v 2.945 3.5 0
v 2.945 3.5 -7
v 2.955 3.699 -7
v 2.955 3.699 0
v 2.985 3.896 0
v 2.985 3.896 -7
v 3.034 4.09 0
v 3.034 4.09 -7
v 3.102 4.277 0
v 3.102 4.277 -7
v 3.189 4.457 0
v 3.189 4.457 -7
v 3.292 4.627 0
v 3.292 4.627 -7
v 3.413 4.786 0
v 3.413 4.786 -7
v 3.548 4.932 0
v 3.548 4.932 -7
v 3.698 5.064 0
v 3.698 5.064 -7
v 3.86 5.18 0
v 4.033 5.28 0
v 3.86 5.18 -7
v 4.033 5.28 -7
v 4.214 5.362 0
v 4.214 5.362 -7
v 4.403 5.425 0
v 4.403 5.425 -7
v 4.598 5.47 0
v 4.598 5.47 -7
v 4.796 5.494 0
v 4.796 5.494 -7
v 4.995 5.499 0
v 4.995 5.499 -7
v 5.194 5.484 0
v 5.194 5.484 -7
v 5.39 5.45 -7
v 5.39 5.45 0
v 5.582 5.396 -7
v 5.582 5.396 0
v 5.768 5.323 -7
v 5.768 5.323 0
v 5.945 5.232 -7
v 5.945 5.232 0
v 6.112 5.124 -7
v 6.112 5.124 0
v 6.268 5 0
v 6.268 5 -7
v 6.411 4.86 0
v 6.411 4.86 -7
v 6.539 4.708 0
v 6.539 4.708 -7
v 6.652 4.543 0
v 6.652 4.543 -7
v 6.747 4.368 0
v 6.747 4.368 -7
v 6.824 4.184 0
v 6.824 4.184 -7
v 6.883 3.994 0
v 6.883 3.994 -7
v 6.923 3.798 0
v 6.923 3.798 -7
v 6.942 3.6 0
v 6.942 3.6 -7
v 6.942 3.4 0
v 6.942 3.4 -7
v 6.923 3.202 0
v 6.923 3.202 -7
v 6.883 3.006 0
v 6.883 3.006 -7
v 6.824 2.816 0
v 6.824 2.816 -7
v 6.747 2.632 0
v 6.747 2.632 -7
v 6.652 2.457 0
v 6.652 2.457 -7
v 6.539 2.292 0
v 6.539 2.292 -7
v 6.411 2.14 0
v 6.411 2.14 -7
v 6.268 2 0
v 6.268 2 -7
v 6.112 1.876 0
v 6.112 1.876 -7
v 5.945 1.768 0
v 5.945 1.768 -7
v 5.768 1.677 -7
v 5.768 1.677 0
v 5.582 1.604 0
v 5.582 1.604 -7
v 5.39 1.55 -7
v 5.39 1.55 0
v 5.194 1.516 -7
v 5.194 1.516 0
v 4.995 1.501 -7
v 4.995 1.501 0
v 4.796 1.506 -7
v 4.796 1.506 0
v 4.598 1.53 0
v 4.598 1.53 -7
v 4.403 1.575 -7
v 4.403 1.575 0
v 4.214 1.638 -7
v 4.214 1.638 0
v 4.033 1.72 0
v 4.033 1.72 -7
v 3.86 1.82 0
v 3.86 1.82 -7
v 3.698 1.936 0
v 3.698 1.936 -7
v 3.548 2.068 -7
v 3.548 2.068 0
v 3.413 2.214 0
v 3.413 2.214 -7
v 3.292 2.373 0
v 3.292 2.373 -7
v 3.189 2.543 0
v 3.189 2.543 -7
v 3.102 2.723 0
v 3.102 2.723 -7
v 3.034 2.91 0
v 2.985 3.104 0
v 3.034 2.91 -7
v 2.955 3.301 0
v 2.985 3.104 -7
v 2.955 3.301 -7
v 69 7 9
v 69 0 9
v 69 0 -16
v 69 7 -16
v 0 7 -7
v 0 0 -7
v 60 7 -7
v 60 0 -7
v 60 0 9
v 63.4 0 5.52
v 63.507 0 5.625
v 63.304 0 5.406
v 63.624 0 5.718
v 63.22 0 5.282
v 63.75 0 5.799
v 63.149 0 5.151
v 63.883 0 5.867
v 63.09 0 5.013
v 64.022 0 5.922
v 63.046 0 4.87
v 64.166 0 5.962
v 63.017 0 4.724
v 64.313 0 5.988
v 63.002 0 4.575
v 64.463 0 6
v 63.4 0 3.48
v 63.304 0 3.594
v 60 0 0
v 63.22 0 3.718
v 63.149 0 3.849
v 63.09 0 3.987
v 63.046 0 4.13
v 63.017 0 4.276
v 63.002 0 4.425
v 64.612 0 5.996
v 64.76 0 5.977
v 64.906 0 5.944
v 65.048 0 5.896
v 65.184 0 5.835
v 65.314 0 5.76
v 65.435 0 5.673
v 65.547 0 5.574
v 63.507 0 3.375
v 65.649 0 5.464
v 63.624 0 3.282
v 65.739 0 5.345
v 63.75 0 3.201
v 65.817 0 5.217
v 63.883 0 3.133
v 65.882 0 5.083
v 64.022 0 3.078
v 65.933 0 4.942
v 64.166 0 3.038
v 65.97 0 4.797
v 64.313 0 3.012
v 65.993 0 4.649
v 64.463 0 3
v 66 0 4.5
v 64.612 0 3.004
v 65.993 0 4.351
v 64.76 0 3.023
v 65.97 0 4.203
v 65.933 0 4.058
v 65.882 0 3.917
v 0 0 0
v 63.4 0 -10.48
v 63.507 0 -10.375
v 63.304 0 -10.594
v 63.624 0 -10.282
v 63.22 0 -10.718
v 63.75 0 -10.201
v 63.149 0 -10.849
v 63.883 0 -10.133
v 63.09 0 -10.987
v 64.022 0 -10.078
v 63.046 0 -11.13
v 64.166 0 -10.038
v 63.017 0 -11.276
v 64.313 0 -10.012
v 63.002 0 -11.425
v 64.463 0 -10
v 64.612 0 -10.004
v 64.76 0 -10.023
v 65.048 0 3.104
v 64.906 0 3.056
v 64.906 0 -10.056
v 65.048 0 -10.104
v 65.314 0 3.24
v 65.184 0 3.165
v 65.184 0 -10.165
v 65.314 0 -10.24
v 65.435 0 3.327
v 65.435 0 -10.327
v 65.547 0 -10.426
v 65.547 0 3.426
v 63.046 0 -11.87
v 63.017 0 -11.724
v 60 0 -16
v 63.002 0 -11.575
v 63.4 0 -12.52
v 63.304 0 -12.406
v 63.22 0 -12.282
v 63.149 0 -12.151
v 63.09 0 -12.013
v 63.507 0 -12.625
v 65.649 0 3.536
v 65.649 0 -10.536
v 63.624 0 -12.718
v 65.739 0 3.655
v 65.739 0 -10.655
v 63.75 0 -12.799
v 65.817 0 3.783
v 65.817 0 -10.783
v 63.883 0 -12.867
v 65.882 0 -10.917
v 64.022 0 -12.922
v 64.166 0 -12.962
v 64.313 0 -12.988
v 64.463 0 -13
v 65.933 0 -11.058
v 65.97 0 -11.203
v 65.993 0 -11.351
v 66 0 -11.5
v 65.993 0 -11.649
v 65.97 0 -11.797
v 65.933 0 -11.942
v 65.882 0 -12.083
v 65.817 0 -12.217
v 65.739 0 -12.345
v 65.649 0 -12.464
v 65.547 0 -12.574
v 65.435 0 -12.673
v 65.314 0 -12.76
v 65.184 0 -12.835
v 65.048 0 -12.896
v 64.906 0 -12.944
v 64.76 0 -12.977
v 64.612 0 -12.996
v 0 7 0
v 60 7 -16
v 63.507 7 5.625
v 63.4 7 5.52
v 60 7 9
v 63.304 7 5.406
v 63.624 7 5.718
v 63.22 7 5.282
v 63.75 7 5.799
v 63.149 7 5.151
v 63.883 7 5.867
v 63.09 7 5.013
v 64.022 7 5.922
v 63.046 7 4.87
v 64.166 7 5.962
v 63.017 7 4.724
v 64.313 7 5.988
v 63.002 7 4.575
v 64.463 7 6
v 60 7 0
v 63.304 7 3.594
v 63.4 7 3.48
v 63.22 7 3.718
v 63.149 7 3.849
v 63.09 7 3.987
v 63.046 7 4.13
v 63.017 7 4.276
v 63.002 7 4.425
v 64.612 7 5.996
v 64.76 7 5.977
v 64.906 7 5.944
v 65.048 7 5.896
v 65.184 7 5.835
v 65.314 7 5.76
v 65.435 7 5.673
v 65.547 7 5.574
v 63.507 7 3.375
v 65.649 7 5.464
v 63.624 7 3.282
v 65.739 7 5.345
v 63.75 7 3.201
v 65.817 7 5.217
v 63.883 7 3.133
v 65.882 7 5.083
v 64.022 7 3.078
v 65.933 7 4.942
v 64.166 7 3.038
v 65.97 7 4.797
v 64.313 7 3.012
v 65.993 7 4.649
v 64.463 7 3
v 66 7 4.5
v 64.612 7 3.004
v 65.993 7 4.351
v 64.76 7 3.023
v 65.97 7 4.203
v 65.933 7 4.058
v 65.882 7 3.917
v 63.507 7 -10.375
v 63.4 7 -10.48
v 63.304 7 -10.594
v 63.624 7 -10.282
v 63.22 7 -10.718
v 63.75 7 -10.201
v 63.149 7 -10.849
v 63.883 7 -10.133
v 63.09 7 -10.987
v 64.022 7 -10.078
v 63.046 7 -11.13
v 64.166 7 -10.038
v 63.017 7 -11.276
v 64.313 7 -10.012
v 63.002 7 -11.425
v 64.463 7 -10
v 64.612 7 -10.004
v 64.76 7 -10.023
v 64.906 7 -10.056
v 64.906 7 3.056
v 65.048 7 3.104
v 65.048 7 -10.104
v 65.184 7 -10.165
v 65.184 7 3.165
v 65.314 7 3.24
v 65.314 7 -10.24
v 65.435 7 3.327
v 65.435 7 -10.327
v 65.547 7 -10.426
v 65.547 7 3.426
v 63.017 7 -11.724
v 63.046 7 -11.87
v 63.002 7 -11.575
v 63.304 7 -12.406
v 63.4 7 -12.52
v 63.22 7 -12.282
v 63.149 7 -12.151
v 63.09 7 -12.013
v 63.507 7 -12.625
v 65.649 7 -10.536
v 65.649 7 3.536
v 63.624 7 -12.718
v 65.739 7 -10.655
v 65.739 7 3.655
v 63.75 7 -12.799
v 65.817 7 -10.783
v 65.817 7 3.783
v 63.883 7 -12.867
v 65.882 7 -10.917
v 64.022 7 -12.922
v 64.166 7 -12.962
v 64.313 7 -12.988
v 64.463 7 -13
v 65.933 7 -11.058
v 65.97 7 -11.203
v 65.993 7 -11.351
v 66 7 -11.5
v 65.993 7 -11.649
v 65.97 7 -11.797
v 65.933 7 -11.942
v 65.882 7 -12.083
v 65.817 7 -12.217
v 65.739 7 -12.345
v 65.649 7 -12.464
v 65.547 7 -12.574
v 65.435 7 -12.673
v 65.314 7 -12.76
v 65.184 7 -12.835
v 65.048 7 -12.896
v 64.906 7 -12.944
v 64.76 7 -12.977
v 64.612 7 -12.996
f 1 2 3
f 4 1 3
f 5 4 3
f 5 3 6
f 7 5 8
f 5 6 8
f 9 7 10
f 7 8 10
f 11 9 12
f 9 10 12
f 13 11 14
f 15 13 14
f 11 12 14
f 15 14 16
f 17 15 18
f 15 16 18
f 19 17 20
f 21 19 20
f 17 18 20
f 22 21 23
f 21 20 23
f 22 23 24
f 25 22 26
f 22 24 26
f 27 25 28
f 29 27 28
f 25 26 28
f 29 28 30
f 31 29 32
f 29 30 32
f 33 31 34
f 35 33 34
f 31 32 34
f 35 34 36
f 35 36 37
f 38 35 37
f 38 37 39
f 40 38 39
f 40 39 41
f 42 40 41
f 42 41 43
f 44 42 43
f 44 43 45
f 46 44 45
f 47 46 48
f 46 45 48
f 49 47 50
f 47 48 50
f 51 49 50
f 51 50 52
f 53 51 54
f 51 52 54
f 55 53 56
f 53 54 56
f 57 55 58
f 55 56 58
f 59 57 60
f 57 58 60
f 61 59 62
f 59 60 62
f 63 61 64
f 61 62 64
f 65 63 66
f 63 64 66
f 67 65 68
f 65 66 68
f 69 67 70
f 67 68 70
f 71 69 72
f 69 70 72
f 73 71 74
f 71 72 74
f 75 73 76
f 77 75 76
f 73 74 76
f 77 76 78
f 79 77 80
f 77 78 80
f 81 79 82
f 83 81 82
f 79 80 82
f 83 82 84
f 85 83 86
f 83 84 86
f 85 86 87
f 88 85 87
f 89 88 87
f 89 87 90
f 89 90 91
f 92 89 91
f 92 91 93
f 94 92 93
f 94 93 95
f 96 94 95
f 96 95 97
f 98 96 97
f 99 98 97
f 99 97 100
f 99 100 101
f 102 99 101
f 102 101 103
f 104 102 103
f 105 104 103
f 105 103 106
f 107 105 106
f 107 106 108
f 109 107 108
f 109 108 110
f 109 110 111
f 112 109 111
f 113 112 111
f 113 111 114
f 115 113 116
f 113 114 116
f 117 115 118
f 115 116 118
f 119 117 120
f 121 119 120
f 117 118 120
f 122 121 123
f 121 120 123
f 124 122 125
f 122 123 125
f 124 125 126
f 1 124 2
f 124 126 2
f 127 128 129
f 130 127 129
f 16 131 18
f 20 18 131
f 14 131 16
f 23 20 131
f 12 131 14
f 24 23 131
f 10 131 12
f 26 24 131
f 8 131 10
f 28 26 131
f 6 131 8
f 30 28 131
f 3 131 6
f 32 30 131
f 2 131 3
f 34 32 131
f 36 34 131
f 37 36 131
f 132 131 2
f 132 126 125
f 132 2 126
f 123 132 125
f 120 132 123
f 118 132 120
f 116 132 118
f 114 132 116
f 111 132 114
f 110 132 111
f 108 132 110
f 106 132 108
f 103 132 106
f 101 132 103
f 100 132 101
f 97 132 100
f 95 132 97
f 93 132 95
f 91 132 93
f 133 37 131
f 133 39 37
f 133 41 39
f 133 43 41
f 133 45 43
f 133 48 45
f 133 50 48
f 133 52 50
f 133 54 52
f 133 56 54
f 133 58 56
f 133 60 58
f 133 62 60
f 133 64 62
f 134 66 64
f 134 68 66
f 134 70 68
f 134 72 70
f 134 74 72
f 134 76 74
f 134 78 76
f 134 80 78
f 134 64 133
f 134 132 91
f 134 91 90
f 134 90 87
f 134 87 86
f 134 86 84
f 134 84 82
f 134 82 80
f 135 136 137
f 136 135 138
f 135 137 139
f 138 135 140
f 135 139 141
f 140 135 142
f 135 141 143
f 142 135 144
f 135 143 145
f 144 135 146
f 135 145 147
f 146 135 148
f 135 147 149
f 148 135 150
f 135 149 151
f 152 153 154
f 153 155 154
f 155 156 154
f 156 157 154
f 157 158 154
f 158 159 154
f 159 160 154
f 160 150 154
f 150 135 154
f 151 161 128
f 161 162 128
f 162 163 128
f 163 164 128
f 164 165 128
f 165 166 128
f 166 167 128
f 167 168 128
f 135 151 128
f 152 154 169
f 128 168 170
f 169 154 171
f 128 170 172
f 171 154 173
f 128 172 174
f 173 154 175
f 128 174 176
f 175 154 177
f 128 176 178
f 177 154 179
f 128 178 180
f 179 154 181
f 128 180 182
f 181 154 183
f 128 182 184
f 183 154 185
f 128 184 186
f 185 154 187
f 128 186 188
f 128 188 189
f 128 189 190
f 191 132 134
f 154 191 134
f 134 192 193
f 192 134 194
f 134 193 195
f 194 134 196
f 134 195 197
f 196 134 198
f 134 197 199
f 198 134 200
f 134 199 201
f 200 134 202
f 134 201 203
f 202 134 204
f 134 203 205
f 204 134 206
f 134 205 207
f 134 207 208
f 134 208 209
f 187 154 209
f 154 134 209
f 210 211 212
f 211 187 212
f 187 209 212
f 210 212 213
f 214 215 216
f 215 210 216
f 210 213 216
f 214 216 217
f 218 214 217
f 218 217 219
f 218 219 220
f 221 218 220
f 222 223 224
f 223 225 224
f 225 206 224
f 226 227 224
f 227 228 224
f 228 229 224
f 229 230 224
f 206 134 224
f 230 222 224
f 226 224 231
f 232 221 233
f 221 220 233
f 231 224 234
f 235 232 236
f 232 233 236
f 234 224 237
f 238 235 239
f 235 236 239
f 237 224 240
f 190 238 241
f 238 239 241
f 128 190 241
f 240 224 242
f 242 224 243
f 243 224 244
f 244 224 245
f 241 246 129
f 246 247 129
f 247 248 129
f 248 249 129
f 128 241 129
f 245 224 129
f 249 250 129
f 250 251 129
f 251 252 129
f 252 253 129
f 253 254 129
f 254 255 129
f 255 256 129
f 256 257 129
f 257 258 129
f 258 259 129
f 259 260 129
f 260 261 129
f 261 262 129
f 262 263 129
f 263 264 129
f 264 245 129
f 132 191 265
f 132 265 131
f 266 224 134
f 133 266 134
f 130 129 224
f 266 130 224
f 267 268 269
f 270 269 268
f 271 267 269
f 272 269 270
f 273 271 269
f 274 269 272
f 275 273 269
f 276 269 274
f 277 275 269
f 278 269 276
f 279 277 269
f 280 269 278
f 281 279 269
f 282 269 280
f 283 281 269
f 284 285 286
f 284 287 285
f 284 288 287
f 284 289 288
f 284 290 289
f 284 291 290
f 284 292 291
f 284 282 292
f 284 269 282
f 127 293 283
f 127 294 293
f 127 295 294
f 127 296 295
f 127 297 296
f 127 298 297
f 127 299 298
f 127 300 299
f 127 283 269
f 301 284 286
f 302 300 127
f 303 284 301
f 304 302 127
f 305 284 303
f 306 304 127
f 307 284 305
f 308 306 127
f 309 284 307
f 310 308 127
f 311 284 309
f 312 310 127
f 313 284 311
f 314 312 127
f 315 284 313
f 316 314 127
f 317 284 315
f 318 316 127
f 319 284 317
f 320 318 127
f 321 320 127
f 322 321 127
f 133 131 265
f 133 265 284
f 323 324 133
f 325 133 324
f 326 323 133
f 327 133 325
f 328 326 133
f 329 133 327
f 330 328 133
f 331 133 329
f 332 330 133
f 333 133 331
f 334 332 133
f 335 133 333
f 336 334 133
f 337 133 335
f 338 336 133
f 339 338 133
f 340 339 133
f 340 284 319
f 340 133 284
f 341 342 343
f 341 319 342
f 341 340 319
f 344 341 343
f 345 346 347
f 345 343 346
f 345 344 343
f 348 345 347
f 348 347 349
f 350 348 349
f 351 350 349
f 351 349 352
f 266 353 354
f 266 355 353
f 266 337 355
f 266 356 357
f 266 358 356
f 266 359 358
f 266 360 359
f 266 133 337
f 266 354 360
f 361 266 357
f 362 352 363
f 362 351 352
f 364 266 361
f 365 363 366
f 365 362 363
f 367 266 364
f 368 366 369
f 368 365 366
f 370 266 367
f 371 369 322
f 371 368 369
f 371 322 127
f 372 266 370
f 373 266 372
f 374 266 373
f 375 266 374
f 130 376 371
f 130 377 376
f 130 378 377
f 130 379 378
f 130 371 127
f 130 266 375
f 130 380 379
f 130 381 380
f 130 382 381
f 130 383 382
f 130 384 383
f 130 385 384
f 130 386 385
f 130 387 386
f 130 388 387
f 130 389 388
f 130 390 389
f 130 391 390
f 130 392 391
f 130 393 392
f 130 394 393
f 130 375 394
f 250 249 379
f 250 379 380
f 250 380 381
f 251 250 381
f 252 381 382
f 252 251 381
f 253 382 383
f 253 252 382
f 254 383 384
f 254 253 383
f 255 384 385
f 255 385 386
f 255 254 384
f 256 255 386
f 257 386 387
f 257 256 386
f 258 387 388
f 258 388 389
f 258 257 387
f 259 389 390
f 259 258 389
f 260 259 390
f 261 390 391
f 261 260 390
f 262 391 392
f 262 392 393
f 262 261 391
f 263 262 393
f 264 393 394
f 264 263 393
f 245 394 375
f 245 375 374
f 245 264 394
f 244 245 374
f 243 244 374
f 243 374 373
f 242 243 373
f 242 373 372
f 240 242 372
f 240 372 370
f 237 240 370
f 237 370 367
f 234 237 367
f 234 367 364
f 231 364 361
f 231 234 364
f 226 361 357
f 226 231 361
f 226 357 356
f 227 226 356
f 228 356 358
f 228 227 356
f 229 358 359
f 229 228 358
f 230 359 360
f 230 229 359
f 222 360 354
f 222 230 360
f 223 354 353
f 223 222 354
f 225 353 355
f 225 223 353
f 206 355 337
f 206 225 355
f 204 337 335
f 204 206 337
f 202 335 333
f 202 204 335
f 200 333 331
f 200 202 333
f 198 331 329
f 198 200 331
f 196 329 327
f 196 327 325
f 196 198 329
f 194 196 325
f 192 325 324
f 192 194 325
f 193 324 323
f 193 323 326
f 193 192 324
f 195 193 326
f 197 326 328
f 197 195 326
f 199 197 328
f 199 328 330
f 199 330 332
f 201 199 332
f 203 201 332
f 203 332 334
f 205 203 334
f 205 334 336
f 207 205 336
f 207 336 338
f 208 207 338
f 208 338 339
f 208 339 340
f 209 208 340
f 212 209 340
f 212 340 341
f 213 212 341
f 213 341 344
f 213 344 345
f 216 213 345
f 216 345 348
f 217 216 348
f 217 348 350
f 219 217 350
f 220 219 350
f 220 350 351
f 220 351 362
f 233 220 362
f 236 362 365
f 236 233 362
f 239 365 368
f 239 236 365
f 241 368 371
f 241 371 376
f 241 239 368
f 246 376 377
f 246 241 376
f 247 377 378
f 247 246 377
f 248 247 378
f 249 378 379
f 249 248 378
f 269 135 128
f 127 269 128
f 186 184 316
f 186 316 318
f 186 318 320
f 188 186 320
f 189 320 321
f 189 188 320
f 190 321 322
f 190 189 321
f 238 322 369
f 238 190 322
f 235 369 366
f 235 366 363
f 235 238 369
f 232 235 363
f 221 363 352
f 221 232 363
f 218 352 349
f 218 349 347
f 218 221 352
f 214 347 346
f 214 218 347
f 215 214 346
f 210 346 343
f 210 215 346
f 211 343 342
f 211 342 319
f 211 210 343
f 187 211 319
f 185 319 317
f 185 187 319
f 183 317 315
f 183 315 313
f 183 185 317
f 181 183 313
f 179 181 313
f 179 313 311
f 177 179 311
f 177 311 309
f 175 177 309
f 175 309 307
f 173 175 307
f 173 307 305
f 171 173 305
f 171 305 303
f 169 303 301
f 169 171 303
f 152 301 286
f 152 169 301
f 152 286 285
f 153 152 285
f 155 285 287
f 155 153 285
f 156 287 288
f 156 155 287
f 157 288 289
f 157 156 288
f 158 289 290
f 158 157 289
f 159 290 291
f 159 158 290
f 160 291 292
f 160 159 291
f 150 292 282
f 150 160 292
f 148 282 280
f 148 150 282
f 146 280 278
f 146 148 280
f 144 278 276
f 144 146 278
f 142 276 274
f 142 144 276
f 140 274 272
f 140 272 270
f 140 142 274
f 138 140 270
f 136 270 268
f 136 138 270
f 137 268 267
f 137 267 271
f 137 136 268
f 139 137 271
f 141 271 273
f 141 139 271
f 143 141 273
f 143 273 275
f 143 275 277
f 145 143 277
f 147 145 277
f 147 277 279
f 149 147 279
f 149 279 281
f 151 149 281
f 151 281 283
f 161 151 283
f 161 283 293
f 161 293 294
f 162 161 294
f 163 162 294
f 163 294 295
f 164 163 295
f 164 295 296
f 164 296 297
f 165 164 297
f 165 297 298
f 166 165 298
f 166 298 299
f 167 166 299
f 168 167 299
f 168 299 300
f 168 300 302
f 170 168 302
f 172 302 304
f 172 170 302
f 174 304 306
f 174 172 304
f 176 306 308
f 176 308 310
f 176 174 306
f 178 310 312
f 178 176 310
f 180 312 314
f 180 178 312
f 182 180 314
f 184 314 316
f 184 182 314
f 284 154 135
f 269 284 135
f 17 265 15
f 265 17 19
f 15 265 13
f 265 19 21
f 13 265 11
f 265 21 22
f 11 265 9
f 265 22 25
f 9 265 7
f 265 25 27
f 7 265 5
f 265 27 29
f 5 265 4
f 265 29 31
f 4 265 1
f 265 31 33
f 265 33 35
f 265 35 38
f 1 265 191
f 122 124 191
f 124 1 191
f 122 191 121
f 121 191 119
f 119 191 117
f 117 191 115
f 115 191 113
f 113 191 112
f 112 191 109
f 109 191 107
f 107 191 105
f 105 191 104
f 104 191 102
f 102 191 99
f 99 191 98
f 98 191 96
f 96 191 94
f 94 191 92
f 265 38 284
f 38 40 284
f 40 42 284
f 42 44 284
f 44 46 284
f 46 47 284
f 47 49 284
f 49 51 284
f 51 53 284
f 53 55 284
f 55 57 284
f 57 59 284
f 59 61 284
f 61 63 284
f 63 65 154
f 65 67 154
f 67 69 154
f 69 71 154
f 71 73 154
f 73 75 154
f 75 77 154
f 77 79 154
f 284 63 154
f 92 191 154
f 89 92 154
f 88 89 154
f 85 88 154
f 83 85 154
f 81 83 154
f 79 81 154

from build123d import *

# Parameters (mm, degrees)
SKETCH1_R           = 1.5
SKETCH1_W           = 60
SKETCH1_H           = 7
BOSS_EXTRUDE1_DEPTH = 7
SKETCH2_R           = 2
CUT_EXTRUDE1_DEPTH  = 7


with BuildPart() as part:
    # Sketch1 → Boss-Extrude1 (new body)
    with BuildSketch(Plane(origin=(0, 0, 0), x_dir=(1, 0, 0), z_dir=(0, 1, 0))):
        Polygon((60, 7), (60, 0), (60, -9), (69, -9), (69, 16), (60, 16), align=None)
        with Locations((64.5, -4.5)):
            Circle(SKETCH1_R, mode=Mode.SUBTRACT)
        with Locations((64.5, 11.5)):
            Circle(SKETCH1_R, mode=Mode.SUBTRACT)
        with Locations((30, 3.5)):
            Rectangle(SKETCH1_W, SKETCH1_H)
    extrude(amount=BOSS_EXTRUDE1_DEPTH)

    # Sketch2 → Cut-Extrude1 (cut)
    with BuildSketch(Plane(origin=(0, 0, -7), x_dir=(-1, 0, 0), z_dir=(0, 0, -1))):
        with Locations((-4.944972507, 3.5)):
            Circle(SKETCH2_R)
    extrude(amount=-CUT_EXTRUDE1_DEPTH, mode=Mode.SUBTRACT)


solid = part.part
